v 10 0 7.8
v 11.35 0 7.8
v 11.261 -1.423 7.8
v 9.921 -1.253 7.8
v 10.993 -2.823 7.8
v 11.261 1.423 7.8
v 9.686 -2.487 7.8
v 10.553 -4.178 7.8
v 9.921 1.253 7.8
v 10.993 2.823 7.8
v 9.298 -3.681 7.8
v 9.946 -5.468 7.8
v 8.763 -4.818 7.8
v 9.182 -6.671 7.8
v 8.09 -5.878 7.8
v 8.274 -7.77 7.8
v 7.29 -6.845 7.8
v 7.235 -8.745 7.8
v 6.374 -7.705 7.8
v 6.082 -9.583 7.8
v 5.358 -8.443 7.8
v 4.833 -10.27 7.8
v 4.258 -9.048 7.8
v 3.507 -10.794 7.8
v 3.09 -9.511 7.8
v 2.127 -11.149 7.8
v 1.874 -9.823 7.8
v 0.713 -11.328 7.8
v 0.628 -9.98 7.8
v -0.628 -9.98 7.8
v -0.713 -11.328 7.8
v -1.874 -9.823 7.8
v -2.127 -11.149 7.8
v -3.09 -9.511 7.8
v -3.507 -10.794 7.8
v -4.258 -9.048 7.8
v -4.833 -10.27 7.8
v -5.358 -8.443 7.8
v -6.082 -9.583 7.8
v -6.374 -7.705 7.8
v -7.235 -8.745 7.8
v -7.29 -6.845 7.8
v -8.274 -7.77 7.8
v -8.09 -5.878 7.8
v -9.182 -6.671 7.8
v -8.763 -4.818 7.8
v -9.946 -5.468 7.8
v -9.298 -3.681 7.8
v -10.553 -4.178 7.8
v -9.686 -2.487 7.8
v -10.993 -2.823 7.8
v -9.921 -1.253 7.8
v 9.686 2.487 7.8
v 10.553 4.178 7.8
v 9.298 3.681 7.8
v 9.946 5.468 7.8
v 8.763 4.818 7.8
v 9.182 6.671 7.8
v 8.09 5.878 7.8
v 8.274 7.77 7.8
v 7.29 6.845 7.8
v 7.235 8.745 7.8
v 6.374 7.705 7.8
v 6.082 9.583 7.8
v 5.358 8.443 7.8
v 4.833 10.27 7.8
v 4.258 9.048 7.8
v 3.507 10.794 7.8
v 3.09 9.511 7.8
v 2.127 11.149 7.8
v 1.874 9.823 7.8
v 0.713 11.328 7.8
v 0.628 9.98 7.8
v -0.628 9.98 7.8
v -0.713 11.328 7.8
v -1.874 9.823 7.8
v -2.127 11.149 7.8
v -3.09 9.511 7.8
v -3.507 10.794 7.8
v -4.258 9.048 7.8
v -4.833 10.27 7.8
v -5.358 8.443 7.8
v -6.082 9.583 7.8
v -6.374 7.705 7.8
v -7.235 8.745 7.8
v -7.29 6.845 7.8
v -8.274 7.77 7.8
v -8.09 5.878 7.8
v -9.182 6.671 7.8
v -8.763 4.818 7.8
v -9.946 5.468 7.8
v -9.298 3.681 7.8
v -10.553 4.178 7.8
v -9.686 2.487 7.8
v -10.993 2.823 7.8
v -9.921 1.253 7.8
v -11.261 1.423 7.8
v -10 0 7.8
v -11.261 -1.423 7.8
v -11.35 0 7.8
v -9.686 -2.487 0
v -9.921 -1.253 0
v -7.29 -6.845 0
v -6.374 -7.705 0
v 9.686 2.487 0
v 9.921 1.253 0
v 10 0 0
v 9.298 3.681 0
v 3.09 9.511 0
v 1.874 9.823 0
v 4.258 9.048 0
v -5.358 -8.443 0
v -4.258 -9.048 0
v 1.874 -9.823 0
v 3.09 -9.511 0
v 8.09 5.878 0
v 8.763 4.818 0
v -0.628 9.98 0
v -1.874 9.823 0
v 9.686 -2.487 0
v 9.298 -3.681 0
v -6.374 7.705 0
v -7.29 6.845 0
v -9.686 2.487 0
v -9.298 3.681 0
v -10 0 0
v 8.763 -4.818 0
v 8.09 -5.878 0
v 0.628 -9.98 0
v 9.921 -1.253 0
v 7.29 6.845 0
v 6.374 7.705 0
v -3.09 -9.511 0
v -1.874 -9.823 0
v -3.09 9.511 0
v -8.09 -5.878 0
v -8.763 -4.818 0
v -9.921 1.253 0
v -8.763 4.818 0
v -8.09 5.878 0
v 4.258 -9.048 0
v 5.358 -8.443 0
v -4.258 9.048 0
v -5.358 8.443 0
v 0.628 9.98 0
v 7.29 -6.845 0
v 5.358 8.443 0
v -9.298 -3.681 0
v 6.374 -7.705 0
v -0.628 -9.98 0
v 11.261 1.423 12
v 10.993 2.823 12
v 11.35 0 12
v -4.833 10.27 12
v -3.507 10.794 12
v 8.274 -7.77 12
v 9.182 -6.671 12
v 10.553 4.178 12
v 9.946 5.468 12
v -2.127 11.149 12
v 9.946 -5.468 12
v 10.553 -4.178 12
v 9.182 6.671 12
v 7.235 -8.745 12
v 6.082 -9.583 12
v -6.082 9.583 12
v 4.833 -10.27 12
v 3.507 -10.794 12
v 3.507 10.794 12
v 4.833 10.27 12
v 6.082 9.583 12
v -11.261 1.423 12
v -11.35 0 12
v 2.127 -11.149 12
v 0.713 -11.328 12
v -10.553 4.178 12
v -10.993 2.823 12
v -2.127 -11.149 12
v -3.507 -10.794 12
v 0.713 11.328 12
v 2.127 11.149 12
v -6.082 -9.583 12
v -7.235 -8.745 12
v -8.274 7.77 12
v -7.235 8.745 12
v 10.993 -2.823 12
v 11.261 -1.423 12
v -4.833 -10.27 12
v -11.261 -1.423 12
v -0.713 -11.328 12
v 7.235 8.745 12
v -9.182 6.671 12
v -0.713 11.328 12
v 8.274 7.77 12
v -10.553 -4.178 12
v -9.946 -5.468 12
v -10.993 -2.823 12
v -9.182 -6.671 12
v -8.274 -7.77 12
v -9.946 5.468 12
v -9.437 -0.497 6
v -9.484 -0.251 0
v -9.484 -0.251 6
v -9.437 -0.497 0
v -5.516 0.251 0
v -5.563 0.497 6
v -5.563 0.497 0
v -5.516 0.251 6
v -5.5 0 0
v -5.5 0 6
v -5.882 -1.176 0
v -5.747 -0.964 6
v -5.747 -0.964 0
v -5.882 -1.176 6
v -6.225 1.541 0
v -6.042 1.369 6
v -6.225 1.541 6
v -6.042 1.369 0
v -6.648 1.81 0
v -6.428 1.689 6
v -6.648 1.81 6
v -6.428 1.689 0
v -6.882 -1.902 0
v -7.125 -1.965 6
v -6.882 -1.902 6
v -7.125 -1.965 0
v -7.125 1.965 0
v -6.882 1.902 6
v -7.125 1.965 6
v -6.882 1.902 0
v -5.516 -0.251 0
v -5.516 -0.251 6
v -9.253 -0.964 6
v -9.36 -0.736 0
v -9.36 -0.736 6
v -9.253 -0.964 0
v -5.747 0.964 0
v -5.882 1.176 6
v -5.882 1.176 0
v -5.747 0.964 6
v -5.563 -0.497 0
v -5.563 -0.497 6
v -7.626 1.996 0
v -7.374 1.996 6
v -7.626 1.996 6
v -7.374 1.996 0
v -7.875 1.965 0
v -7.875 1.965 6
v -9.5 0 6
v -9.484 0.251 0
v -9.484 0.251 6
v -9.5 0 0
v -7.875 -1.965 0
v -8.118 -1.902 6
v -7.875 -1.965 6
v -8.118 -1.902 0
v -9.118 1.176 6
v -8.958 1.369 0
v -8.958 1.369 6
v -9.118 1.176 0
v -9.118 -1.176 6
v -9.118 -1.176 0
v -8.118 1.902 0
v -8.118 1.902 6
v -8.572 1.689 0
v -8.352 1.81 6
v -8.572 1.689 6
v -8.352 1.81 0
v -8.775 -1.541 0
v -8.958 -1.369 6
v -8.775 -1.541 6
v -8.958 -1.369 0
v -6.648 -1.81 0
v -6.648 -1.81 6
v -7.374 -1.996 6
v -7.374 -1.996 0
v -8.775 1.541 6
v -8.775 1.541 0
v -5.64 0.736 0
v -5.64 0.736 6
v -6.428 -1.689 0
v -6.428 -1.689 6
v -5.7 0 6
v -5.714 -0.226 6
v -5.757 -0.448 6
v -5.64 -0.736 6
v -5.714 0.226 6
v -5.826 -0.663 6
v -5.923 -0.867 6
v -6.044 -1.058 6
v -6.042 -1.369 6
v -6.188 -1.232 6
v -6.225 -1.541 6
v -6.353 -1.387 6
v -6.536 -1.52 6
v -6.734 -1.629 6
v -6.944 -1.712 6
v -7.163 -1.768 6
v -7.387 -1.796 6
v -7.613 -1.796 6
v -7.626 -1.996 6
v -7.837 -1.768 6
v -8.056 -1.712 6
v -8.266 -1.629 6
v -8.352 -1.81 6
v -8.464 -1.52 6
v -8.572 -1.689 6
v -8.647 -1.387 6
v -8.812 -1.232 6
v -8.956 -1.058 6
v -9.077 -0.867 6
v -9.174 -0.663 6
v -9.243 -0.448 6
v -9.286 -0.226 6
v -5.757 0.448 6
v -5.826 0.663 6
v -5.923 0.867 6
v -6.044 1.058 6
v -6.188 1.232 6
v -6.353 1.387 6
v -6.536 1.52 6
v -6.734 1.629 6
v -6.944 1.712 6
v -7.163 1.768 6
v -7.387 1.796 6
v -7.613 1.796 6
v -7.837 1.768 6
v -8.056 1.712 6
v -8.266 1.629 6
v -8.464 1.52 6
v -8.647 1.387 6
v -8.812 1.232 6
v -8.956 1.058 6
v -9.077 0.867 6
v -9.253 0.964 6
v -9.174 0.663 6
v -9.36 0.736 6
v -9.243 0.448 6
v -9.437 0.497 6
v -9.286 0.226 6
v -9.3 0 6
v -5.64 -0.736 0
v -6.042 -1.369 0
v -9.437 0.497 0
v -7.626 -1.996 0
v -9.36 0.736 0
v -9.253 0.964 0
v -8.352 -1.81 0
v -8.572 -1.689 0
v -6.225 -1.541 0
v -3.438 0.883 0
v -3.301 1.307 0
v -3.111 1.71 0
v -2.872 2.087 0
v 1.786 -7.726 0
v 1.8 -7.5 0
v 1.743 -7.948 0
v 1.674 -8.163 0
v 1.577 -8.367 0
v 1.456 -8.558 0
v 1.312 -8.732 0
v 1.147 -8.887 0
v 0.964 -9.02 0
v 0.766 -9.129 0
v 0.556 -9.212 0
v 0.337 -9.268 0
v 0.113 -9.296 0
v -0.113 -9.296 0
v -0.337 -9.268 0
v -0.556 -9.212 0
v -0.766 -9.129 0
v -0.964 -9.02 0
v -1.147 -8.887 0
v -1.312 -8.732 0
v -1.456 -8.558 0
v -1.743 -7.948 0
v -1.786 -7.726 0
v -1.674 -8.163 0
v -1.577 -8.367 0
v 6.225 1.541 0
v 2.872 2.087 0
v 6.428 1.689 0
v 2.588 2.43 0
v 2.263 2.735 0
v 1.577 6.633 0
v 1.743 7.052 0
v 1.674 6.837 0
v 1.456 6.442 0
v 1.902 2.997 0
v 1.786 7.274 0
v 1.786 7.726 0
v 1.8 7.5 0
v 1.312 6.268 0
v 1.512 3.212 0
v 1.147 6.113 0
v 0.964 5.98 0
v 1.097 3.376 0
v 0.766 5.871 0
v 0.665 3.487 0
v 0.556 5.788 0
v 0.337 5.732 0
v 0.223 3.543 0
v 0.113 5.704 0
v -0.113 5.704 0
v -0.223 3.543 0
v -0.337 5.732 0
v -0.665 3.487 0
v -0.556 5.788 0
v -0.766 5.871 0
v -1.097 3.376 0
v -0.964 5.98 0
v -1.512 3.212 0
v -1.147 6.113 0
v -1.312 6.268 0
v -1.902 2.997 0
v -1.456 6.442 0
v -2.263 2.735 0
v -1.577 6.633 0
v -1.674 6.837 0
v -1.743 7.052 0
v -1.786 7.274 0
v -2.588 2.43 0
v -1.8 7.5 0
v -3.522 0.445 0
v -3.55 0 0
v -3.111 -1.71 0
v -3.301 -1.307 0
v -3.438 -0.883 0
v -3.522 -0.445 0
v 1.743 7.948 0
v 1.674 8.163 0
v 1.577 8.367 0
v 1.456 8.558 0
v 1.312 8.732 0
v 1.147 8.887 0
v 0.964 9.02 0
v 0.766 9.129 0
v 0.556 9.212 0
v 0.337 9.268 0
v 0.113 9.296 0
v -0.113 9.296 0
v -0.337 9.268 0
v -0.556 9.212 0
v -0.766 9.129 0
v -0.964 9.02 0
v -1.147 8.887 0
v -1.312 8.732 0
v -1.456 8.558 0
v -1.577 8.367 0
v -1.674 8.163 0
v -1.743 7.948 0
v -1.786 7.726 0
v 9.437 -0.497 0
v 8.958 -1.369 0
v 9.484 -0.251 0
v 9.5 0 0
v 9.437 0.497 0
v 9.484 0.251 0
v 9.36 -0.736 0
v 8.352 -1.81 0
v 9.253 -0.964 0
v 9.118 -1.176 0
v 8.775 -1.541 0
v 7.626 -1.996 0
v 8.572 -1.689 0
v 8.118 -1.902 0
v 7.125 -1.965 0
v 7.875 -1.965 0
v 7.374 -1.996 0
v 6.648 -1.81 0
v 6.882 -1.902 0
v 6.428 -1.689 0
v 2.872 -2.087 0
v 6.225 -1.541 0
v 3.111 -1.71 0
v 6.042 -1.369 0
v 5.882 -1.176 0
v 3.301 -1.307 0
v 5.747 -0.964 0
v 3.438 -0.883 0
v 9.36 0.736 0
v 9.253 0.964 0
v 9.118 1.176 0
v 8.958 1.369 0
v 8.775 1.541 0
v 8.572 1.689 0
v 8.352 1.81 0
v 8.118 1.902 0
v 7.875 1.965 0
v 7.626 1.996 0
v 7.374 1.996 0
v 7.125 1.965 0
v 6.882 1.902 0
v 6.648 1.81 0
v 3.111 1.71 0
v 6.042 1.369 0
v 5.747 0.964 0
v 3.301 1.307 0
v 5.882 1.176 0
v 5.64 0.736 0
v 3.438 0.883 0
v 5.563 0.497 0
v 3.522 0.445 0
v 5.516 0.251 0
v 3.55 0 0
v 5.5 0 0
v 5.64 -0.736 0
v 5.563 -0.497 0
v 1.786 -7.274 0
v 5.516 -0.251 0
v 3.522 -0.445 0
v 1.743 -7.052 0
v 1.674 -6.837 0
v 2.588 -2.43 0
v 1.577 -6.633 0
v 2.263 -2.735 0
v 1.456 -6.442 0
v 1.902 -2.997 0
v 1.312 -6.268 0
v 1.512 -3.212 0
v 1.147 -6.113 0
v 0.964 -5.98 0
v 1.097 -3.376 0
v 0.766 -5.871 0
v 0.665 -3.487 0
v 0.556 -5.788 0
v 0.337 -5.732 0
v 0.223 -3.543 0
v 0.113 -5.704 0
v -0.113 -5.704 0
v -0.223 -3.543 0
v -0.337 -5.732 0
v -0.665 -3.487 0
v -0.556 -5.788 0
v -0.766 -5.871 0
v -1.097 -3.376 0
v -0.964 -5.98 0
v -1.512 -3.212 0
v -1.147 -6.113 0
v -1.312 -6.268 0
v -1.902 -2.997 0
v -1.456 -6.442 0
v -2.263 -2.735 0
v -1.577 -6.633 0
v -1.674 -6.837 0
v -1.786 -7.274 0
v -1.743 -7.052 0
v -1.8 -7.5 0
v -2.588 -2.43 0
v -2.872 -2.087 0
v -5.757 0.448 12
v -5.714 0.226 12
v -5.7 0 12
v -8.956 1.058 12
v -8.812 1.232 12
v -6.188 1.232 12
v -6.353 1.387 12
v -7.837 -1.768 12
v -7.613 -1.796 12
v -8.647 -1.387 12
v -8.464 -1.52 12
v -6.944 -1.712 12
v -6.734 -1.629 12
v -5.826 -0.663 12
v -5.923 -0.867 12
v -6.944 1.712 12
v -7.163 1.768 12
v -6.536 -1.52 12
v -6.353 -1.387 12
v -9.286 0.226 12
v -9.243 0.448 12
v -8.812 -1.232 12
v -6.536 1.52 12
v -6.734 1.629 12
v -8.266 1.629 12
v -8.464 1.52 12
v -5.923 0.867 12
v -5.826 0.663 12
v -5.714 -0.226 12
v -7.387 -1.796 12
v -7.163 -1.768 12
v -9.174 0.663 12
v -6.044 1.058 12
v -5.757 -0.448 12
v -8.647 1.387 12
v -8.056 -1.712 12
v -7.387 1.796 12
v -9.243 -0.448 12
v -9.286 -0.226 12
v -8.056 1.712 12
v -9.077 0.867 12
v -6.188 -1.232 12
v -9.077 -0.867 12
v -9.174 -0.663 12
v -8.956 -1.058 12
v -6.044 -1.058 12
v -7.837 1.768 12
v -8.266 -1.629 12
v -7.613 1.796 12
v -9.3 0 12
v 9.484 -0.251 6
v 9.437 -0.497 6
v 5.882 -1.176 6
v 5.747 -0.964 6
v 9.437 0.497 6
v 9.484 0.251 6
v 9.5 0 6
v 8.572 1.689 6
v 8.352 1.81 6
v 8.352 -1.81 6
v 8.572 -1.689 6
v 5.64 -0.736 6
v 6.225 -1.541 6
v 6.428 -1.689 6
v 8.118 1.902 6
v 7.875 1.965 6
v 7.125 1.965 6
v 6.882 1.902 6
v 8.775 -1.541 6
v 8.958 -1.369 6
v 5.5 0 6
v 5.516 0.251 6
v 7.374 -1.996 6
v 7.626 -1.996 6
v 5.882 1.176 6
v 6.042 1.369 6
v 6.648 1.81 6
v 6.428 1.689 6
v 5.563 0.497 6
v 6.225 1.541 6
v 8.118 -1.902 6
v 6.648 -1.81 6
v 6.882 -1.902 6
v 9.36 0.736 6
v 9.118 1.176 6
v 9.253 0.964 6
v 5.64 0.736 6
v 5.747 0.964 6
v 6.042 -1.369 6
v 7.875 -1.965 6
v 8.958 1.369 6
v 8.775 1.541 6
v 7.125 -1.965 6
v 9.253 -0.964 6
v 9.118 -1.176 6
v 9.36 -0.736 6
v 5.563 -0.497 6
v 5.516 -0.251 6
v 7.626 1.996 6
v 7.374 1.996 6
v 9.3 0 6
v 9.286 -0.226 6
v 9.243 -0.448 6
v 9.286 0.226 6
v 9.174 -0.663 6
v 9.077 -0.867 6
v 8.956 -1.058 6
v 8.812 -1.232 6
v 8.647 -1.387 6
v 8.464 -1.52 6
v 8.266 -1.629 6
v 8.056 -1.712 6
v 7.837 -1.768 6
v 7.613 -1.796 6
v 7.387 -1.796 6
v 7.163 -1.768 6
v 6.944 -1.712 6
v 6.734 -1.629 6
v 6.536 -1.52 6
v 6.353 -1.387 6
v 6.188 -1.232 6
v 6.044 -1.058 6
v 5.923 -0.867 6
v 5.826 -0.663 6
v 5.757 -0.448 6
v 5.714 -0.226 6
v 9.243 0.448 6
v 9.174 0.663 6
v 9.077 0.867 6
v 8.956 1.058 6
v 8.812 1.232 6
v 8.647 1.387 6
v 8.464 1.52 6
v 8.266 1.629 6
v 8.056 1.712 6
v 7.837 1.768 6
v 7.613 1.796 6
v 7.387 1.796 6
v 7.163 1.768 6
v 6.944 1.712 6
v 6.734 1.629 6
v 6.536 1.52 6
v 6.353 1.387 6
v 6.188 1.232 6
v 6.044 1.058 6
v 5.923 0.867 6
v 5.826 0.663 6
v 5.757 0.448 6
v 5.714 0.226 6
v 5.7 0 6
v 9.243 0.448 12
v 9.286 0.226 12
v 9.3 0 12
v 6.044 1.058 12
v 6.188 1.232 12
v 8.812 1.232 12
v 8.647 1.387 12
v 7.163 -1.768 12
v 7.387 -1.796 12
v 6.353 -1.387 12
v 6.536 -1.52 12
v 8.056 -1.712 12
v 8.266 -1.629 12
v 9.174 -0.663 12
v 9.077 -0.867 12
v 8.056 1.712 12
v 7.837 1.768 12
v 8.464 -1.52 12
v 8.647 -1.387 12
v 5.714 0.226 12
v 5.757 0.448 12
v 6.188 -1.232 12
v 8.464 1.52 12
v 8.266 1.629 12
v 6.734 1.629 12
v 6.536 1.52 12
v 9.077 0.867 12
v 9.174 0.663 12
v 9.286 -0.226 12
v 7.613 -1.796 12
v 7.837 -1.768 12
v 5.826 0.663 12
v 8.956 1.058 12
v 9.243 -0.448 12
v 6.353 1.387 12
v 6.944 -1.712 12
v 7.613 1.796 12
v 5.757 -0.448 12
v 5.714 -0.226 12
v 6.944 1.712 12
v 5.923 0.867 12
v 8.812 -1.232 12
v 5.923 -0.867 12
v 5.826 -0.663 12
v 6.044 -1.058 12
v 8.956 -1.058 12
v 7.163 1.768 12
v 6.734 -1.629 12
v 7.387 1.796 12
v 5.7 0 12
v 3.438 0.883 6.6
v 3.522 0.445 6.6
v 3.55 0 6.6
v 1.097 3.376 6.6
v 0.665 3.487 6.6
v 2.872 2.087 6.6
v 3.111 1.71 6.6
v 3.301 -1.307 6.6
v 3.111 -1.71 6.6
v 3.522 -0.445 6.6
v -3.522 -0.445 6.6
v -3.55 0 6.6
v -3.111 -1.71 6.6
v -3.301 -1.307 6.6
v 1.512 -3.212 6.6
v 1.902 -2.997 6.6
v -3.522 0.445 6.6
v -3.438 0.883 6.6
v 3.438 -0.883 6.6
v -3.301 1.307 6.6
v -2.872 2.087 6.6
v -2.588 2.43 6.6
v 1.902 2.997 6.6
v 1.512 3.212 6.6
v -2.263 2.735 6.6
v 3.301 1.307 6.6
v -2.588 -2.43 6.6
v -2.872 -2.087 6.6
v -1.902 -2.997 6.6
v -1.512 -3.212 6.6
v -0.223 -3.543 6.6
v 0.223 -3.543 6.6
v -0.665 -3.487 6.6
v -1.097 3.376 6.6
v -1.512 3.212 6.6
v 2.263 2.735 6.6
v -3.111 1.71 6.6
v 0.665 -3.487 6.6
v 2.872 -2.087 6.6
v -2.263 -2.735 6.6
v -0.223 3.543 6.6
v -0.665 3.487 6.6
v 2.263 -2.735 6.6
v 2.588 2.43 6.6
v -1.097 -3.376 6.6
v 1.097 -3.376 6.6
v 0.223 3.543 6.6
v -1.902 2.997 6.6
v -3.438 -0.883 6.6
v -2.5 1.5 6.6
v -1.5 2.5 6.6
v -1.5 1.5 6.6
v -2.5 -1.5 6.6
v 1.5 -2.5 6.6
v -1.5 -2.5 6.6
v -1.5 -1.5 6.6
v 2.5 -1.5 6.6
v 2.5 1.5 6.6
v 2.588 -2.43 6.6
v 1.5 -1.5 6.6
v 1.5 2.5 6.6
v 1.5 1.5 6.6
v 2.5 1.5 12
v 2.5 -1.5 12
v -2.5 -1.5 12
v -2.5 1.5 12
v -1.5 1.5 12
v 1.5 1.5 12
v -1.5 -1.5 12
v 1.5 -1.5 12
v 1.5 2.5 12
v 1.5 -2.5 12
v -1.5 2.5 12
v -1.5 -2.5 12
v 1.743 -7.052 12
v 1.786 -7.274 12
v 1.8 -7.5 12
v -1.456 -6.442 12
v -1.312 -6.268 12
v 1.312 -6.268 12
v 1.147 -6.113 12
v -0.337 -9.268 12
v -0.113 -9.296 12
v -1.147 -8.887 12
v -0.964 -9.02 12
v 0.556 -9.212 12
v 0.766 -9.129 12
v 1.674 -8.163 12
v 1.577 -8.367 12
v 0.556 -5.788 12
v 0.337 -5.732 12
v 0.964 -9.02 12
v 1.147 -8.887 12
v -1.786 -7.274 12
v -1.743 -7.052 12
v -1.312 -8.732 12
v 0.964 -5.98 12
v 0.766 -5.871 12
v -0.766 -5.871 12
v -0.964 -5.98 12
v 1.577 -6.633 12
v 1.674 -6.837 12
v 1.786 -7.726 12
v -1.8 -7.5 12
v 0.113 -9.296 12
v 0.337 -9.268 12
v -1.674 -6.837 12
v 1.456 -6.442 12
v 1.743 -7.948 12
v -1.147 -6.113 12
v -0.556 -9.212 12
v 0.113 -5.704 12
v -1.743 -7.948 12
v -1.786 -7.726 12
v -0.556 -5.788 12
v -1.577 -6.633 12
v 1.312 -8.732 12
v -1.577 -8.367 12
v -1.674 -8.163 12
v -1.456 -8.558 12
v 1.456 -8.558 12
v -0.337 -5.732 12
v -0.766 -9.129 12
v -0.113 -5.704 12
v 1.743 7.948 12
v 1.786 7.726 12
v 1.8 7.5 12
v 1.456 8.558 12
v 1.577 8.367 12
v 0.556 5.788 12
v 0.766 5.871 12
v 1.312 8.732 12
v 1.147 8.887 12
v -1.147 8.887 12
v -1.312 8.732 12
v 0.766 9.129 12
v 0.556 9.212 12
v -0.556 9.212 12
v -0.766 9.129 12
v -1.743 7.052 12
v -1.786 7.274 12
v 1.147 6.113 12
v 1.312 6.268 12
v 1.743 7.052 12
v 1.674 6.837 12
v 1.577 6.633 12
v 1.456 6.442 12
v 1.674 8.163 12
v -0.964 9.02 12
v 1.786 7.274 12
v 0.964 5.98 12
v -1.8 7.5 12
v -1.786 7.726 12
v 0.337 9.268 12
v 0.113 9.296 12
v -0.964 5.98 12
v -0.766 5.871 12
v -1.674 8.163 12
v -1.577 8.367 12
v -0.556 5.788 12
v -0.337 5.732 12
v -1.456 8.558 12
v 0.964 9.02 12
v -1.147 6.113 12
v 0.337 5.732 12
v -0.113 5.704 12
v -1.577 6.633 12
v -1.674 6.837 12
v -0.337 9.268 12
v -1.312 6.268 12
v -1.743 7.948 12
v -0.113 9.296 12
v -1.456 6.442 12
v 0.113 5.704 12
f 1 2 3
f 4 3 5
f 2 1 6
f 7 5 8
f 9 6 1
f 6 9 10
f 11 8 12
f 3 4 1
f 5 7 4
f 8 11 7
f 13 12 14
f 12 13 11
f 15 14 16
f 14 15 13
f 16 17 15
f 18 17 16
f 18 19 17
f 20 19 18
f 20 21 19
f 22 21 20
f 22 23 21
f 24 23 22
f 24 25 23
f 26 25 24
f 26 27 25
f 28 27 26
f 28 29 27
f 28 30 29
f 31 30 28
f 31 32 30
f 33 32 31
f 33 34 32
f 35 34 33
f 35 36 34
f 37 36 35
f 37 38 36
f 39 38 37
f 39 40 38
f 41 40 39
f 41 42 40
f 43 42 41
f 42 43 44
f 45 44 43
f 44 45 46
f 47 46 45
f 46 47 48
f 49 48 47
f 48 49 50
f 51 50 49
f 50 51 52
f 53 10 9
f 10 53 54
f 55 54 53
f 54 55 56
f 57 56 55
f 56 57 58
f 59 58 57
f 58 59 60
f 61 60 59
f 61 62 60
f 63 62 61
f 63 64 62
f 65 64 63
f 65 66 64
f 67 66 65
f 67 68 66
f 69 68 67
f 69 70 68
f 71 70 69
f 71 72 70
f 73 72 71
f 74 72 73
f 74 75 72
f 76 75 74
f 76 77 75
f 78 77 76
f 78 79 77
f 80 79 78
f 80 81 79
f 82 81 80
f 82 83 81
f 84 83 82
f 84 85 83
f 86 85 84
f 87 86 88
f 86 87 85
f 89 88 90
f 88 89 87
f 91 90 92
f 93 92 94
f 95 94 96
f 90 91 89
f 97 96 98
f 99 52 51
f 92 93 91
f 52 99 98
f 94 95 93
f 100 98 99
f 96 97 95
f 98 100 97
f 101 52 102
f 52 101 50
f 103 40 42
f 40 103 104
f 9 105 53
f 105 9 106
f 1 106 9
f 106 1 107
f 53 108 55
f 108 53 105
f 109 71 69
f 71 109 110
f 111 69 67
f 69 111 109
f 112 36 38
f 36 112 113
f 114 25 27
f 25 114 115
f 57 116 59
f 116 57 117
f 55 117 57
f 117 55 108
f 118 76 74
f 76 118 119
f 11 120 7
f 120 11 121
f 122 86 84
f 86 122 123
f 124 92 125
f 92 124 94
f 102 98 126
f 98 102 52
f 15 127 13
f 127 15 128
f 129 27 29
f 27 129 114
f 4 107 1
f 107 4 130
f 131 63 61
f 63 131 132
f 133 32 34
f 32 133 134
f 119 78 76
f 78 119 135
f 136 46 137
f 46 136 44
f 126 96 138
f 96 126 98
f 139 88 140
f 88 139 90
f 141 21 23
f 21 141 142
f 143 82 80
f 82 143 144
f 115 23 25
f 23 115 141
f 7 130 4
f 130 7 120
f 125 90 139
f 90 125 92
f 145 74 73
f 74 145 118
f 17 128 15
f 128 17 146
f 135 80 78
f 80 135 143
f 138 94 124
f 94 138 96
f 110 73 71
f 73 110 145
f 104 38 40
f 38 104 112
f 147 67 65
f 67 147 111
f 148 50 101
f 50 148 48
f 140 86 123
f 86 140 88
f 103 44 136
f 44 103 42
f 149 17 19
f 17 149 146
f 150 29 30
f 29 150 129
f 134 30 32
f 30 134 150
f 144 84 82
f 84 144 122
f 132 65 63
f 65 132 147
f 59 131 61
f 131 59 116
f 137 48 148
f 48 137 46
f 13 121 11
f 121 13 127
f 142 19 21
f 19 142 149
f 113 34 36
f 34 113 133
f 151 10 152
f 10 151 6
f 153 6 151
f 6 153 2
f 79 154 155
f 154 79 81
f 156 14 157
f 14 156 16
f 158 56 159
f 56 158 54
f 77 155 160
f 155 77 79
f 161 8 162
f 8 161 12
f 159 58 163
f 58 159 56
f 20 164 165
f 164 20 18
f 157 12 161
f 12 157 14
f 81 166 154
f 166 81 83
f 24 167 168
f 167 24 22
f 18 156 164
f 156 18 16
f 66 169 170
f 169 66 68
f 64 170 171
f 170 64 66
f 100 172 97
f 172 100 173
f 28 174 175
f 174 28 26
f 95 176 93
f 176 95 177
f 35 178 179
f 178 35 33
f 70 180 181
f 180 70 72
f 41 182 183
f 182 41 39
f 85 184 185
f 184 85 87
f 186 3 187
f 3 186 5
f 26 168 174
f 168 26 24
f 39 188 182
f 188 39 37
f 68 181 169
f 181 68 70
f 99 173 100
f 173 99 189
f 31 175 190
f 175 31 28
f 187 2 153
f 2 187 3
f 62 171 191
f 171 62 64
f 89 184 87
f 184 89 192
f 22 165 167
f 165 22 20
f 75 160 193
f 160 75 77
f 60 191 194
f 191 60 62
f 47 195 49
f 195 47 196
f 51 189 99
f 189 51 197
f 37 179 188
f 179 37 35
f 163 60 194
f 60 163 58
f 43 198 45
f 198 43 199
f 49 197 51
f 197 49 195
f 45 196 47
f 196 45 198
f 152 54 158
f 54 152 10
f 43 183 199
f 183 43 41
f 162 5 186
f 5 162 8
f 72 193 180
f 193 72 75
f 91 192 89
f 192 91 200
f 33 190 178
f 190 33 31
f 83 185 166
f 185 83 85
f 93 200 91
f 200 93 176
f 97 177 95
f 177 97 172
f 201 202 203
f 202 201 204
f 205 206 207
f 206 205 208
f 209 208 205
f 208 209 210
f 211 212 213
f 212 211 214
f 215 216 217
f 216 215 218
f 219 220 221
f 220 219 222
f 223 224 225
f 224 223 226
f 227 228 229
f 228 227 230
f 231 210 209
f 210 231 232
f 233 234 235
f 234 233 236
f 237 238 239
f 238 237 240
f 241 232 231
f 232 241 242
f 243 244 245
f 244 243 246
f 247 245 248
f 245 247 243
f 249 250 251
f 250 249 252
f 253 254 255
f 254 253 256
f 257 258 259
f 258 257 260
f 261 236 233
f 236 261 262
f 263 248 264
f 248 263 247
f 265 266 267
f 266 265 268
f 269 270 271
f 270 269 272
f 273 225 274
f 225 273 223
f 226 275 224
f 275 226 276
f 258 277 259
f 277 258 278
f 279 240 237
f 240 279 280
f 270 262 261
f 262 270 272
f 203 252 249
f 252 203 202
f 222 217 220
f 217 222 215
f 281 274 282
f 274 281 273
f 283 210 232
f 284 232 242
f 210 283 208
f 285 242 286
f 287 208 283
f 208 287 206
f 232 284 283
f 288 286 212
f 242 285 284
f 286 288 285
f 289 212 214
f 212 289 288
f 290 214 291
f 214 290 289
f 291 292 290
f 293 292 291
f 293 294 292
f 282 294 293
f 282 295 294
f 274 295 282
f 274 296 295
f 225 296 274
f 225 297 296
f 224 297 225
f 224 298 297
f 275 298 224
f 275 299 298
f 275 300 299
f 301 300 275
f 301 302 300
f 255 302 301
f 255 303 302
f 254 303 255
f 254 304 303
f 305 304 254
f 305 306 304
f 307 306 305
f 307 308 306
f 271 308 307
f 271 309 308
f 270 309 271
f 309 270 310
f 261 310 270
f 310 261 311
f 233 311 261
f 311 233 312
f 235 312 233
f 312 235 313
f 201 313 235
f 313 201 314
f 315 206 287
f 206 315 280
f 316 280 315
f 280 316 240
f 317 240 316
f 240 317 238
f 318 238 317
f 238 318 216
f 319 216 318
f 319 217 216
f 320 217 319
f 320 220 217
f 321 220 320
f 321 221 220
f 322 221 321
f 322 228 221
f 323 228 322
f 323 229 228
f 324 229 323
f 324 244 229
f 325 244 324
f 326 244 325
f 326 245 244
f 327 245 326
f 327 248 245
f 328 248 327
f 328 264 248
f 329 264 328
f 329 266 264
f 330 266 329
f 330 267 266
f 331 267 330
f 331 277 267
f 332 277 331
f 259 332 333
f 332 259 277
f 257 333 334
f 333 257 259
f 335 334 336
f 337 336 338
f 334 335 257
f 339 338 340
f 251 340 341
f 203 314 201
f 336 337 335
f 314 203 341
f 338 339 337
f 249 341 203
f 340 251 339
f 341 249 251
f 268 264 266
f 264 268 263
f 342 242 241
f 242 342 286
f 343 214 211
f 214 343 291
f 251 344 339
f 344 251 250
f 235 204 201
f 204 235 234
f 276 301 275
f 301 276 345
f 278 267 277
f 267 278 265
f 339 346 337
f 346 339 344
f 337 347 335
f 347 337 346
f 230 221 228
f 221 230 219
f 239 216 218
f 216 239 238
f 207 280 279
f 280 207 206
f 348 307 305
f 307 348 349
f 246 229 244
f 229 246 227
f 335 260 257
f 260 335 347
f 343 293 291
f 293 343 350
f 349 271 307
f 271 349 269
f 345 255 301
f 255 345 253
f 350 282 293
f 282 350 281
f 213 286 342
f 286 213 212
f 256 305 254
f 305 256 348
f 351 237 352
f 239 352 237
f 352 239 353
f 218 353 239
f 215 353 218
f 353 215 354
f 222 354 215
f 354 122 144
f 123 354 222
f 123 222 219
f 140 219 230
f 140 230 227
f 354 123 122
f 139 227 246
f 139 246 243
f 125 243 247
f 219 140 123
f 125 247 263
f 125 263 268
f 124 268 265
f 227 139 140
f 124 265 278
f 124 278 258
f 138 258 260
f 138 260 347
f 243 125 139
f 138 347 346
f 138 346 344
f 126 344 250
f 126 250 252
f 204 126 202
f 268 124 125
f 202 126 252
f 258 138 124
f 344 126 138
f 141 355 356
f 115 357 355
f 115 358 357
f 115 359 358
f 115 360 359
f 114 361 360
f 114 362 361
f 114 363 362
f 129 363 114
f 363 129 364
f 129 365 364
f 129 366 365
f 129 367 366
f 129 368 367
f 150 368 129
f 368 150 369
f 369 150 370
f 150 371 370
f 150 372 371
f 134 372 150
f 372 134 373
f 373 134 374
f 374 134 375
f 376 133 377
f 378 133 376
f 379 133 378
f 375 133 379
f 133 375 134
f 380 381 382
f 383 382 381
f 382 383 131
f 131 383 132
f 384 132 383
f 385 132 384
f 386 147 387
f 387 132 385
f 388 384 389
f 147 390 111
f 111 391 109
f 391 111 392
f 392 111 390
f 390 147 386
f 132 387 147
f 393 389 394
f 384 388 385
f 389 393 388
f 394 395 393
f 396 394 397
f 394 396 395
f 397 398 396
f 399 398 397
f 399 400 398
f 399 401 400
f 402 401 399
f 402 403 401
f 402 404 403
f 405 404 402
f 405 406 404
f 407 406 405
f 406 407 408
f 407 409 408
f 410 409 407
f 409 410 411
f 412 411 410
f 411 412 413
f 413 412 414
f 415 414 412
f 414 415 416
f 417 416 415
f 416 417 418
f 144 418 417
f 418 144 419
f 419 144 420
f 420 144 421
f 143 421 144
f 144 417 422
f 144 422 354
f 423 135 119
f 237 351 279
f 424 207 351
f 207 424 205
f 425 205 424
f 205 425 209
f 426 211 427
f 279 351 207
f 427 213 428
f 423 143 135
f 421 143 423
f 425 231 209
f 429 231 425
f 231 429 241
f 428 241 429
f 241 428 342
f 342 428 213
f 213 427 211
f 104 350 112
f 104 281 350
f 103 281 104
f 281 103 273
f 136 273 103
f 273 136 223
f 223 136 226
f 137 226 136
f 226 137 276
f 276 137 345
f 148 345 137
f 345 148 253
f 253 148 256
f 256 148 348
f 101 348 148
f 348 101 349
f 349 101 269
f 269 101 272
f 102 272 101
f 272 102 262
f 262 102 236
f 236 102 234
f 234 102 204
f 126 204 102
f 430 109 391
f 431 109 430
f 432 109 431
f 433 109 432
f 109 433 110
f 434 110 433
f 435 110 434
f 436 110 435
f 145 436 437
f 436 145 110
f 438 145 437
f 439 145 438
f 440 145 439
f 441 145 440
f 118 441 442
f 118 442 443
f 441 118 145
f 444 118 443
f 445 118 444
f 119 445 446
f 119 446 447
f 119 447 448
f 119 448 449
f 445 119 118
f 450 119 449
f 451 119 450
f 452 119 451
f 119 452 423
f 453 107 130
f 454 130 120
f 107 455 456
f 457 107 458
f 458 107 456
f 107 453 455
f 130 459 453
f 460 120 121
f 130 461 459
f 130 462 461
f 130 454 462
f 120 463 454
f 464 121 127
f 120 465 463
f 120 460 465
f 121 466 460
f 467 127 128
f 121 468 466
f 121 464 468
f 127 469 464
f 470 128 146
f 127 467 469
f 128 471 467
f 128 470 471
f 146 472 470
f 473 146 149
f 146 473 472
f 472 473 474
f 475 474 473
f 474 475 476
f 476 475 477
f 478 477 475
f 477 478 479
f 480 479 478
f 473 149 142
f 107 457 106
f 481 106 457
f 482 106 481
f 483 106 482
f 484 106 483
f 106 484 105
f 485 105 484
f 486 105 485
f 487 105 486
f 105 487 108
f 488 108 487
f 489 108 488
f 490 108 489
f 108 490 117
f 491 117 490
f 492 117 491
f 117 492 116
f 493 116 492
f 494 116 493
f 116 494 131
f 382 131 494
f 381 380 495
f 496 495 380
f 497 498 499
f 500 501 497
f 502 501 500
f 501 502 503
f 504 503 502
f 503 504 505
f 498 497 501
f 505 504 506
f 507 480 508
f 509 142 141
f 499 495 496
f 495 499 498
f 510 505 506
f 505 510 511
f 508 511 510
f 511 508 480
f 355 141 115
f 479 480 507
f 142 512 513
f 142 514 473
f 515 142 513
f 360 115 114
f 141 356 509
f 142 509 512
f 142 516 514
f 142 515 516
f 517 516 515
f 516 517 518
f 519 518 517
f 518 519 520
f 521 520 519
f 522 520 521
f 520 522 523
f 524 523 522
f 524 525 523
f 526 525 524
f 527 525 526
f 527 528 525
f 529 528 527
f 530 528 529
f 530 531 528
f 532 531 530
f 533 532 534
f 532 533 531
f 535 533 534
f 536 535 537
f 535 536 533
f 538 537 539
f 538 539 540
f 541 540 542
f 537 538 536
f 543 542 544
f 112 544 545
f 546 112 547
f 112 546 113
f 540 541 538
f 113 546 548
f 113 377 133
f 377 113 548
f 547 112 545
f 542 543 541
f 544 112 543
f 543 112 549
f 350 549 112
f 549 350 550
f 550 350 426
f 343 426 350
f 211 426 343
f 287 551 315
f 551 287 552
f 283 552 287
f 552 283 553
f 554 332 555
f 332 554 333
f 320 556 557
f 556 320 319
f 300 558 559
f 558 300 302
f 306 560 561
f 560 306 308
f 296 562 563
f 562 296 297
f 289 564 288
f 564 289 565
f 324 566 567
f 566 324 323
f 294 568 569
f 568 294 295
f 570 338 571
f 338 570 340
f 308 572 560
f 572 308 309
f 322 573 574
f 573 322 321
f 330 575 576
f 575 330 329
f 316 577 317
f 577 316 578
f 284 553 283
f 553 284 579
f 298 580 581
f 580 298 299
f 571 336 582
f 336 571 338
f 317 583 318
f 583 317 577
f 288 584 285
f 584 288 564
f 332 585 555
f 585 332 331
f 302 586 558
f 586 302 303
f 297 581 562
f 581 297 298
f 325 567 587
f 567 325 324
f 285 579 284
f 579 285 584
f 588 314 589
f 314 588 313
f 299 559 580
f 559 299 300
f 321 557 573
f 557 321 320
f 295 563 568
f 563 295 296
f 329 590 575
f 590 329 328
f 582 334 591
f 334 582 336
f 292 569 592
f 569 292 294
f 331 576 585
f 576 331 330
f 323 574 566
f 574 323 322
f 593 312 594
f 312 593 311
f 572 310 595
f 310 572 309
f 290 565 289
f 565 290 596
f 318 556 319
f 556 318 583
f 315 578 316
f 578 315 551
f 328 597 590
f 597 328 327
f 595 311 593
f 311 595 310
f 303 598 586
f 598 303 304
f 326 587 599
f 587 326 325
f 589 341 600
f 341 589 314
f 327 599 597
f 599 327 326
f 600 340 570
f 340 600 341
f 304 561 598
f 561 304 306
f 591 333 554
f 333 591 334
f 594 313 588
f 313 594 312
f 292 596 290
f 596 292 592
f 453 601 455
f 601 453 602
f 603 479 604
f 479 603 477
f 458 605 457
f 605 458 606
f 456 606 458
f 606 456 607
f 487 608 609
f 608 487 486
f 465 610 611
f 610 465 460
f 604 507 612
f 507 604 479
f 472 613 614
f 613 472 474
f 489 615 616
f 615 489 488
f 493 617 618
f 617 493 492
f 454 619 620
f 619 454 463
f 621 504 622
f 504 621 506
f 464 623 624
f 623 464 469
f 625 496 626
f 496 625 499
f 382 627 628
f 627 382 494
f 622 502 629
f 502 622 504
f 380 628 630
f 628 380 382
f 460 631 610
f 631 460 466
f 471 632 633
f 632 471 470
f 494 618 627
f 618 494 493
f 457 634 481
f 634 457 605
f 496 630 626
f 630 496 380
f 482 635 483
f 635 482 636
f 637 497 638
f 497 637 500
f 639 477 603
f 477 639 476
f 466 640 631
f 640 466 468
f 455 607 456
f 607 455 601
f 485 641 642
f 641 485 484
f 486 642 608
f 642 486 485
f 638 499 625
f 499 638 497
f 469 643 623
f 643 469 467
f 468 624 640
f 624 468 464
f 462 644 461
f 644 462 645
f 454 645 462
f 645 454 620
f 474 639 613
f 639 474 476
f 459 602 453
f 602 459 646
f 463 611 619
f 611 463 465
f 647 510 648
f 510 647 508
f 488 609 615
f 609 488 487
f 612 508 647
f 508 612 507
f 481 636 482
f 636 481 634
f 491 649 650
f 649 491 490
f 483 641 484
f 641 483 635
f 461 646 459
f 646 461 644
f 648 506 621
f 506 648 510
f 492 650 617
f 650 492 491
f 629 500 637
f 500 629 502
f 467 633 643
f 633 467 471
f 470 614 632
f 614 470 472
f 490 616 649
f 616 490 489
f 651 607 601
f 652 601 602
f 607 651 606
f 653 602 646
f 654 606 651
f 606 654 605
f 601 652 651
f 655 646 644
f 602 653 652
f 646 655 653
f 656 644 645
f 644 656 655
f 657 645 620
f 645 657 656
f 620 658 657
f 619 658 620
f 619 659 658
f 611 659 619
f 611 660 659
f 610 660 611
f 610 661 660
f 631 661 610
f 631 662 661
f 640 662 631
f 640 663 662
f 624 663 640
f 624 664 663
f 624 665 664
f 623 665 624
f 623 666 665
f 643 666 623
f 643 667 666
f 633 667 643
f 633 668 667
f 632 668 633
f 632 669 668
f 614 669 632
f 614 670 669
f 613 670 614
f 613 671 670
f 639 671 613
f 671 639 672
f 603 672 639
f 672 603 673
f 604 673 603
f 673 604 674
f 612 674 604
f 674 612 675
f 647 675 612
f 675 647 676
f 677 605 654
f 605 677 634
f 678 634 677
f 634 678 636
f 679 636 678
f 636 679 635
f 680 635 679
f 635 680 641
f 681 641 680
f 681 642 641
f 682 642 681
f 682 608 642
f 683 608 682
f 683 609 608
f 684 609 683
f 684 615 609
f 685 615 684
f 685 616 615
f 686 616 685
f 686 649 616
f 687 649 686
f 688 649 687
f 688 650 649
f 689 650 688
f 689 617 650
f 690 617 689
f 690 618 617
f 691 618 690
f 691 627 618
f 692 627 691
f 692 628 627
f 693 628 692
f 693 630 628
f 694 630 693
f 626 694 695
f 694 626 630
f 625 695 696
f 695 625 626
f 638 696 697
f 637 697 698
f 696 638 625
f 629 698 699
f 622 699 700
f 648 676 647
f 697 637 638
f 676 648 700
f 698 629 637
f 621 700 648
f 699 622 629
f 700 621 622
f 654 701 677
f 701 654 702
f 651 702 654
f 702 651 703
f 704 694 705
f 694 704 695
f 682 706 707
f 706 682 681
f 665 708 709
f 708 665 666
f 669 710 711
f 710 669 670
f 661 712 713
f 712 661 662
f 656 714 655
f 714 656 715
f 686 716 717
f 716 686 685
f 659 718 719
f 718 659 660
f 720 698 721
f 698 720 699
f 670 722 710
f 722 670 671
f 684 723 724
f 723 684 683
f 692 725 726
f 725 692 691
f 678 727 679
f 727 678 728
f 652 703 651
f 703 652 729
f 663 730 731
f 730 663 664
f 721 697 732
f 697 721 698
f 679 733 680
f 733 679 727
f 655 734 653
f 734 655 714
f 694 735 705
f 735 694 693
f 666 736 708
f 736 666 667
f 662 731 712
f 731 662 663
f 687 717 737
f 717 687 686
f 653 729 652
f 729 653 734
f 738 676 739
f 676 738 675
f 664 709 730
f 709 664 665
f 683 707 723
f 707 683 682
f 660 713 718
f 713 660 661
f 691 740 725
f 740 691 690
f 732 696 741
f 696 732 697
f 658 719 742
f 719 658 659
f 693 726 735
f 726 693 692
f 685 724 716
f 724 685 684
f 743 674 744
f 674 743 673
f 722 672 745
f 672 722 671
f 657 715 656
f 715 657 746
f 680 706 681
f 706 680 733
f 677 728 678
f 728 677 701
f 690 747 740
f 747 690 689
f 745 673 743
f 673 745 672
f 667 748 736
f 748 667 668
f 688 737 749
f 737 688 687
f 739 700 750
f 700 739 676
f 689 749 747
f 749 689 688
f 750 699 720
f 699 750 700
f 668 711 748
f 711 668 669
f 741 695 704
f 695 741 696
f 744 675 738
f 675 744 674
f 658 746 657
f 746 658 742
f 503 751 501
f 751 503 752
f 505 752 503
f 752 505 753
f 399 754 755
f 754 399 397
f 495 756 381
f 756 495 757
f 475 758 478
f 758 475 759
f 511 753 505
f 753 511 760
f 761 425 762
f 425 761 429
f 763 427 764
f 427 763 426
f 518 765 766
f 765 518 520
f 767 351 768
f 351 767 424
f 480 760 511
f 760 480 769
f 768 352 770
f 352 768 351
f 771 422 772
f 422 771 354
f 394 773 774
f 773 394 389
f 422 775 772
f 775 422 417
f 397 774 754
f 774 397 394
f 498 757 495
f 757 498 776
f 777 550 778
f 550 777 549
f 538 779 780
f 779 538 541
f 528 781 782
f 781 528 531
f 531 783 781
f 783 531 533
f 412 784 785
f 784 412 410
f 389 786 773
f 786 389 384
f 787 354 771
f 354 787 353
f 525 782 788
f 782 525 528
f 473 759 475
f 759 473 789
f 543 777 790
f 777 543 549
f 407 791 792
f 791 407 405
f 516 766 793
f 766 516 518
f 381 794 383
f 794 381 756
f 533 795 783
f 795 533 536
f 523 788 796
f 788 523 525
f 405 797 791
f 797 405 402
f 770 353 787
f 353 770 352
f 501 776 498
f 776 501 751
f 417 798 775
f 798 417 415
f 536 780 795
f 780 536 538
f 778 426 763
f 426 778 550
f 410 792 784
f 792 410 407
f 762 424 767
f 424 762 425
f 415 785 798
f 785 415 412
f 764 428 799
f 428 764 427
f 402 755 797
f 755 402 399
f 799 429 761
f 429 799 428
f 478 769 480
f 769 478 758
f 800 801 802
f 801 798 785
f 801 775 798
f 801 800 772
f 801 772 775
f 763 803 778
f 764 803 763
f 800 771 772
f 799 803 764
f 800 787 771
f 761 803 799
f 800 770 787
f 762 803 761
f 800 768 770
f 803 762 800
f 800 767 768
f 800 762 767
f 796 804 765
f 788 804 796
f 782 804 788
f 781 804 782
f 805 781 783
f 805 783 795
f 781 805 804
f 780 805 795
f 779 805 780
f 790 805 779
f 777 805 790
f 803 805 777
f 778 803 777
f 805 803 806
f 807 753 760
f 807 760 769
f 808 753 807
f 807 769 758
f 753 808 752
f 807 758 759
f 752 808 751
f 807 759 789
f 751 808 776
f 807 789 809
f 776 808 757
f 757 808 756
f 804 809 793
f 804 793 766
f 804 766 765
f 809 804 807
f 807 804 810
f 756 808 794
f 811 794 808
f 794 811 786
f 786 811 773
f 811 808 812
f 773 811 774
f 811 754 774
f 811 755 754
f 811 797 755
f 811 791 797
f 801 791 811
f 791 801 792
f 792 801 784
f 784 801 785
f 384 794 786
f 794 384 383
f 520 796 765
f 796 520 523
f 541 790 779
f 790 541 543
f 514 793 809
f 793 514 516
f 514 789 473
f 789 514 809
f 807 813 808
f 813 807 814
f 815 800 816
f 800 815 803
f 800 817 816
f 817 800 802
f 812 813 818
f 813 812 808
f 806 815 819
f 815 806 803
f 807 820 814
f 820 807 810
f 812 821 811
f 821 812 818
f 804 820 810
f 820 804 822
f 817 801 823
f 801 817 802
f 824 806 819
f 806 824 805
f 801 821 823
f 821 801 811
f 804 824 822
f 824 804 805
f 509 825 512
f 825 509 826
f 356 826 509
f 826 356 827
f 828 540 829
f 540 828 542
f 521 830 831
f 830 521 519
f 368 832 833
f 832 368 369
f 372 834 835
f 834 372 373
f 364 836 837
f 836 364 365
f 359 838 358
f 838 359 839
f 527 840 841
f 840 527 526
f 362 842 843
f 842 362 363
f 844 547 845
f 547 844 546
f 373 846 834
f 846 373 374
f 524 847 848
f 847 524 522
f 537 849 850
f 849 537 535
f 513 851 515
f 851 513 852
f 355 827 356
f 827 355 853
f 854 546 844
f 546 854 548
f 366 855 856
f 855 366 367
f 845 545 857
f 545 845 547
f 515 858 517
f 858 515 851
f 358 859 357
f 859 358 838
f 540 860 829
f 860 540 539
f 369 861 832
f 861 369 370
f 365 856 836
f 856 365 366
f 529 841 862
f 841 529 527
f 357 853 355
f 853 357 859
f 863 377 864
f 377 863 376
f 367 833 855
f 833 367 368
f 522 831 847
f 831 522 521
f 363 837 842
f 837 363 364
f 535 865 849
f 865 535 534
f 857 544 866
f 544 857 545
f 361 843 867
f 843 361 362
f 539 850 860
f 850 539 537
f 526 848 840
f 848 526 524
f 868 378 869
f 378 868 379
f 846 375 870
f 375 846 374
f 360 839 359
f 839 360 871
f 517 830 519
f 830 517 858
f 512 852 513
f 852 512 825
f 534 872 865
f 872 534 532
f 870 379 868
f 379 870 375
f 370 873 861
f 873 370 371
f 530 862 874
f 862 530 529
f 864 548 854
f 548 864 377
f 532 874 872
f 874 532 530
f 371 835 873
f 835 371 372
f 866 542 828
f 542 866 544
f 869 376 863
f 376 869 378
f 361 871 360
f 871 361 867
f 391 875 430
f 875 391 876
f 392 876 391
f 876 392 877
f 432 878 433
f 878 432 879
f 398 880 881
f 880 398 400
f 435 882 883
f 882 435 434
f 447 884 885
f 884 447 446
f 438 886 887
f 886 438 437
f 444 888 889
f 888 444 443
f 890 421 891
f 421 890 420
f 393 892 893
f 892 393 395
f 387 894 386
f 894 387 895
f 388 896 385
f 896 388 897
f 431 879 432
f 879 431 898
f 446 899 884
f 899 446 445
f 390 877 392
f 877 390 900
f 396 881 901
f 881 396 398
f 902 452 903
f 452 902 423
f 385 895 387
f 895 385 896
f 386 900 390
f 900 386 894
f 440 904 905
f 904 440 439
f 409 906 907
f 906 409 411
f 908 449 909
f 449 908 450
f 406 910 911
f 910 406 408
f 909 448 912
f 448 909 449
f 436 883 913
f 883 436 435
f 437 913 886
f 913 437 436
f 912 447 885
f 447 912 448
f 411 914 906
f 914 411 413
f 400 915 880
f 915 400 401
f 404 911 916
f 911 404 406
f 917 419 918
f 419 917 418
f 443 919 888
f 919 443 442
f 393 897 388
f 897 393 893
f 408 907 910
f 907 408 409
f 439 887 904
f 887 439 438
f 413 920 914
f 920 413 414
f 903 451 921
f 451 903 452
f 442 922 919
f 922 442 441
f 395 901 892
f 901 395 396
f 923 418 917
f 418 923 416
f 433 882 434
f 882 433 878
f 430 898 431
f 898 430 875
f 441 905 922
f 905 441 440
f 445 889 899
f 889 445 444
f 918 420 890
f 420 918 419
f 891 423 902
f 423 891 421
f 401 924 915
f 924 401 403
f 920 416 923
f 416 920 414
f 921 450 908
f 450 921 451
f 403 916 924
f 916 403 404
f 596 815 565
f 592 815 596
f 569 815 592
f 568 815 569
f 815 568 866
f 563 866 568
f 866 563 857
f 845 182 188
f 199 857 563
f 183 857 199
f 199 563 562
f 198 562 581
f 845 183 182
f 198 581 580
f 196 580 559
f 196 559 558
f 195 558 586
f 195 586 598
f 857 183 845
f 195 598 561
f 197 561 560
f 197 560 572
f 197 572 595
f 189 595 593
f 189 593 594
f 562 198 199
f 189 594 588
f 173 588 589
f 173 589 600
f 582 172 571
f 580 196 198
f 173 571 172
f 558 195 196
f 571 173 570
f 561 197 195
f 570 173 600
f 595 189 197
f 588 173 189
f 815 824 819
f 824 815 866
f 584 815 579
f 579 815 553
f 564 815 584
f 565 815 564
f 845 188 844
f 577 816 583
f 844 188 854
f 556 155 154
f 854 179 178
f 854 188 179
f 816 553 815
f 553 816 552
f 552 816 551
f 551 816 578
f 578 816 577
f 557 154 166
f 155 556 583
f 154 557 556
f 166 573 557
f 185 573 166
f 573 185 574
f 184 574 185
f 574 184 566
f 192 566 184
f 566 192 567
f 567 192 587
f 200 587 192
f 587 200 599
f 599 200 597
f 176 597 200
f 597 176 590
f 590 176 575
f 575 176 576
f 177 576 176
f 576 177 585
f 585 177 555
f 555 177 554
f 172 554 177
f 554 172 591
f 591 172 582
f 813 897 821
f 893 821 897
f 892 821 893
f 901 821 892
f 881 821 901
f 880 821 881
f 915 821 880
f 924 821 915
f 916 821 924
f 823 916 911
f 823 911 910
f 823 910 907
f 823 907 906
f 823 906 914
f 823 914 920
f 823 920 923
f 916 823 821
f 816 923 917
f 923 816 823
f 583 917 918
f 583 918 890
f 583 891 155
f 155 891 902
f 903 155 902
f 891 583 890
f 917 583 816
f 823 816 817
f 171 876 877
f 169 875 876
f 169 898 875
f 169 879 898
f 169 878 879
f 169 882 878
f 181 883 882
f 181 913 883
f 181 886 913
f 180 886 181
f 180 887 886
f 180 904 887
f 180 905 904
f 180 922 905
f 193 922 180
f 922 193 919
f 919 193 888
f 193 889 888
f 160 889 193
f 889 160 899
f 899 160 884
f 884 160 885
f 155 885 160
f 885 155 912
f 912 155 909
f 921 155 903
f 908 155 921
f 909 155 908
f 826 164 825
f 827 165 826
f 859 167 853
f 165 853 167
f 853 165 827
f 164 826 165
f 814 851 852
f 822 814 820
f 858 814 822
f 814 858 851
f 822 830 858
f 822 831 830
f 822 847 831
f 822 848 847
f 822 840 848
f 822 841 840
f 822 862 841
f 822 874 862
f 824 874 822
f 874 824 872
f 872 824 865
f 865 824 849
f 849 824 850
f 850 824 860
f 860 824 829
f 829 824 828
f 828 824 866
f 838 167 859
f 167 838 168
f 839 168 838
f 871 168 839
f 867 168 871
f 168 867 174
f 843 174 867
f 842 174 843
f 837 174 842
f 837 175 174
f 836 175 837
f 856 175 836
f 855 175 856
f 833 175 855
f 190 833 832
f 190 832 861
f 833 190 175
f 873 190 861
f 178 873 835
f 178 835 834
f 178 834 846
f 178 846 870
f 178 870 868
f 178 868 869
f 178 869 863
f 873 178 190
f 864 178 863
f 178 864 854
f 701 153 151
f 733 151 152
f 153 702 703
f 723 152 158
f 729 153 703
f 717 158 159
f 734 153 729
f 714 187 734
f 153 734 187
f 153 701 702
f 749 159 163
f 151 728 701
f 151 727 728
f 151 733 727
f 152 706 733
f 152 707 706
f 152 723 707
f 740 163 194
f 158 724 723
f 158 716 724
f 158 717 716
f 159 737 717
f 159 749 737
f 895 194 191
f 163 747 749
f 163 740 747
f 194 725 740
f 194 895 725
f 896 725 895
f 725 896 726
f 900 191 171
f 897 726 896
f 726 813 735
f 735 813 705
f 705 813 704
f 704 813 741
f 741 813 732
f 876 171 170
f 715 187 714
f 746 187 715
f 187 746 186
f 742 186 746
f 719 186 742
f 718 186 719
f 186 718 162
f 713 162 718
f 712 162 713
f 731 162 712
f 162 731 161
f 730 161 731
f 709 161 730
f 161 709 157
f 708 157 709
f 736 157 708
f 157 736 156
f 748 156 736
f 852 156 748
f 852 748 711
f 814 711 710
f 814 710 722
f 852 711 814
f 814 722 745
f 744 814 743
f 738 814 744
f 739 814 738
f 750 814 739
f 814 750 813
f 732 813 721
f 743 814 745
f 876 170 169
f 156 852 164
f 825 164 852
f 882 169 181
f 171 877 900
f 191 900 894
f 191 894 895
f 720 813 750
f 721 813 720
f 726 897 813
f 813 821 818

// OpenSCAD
$fn = 50;

difference() {
	union() {
		translate(v = [0, 0, 0]) {
			rotate(a = [0, 0, 0]) {
				difference() {
					union() {
						translate(v = [0, 0, 6.0]) {
							rotate(a = [0, 0, 0]) {
								difference() {
									union() {
										translate(v = [0, 0, -6.0]) {
											cylinder(h = 12, r = 12);
										}
									}
									union() {
										translate(v = [0, 0, 0]) {
											rotate(a = [0, 0, 0]) {
												difference() {
													union() {
														translate(v = [0, 0, -1.8]) {
															cylinder(h = 3.6, r = 13.7);
														}
													}
													union() {
														translate(v = [0, 0, -1.81]) {
															cylinder(h = 3.62, r = 10.0);
														}
													}
												}
											}
										}
										translate(v = [0, 0, -3]) {
											rotate(a = [0, 0, 0]) {
												difference() {
													union() {
														translate(v = [0, 0, -1.8]) {
															cylinder(h = 3.6, r = 13.7);
														}
													}
													union() {
														translate(v = [0, 0, -1.81]) {
															cylinder(h = 3.62, r = 10.0);
														}
													}
												}
											}
										}
										translate(v = [0, 0, -6]) {
											rotate(a = [0, 0, 0]) {
												difference() {
													union() {
														translate(v = [0, 0, -1.8]) {
															cylinder(h = 3.6, r = 13.7);
														}
													}
													union() {
														translate(v = [0, 0, -1.81]) {
															cylinder(h = 3.62, r = 10.0);
														}
													}
												}
											}
										}
										translate(v = [0, 0, 0]) {
											rotate(a = [0, 0, 0]) {
												difference() {
													union() {
														translate(v = [0, 0, -21.0]) {
															cylinder(h = 42, r = 12.35);
														}
													}
													union() {
														translate(v = [0, 0, -21.01]) {
															cylinder(h = 42.02, r = 11.35);
														}
													}
												}
											}
										}
										translate(v = [-7.5, 0, -6.0]) {
											cylinder(h = 6, r = 2.0);
										}
										translate(v = [-7.5, 0, -7.0]) {
											cylinder(h = 14, r = 1.8);
										}
										translate(v = [7.5, 0, -6.0]) {
											cylinder(h = 6, r = 2.0);
										}
										translate(v = [7.5, 0, -7.0]) {
											cylinder(h = 14, r = 1.8);
										}
										translate(v = [0, 0, -6.000000000000001]) {
											cylinder(h = 6.6, r = 3.55);
										}
										translate(v = [-2.5, -1.5, -7.0]) {
											cube(size = [5, 3, 14]);
										}
										translate(v = [-1.5, -2.5, -7.0]) {
											cube(size = [3, 5, 14]);
										}
										translate(v = [0.0, -7.5, -7.0]) {
											cylinder(h = 14, r = 1.8);
										}
										translate(v = [0.0, 7.5, -7.0]) {
											cylinder(h = 14, r = 1.8);
										}
									}
								}
							}
						}
					}
					union();
				}
			}
		}
	}
	union();
}
